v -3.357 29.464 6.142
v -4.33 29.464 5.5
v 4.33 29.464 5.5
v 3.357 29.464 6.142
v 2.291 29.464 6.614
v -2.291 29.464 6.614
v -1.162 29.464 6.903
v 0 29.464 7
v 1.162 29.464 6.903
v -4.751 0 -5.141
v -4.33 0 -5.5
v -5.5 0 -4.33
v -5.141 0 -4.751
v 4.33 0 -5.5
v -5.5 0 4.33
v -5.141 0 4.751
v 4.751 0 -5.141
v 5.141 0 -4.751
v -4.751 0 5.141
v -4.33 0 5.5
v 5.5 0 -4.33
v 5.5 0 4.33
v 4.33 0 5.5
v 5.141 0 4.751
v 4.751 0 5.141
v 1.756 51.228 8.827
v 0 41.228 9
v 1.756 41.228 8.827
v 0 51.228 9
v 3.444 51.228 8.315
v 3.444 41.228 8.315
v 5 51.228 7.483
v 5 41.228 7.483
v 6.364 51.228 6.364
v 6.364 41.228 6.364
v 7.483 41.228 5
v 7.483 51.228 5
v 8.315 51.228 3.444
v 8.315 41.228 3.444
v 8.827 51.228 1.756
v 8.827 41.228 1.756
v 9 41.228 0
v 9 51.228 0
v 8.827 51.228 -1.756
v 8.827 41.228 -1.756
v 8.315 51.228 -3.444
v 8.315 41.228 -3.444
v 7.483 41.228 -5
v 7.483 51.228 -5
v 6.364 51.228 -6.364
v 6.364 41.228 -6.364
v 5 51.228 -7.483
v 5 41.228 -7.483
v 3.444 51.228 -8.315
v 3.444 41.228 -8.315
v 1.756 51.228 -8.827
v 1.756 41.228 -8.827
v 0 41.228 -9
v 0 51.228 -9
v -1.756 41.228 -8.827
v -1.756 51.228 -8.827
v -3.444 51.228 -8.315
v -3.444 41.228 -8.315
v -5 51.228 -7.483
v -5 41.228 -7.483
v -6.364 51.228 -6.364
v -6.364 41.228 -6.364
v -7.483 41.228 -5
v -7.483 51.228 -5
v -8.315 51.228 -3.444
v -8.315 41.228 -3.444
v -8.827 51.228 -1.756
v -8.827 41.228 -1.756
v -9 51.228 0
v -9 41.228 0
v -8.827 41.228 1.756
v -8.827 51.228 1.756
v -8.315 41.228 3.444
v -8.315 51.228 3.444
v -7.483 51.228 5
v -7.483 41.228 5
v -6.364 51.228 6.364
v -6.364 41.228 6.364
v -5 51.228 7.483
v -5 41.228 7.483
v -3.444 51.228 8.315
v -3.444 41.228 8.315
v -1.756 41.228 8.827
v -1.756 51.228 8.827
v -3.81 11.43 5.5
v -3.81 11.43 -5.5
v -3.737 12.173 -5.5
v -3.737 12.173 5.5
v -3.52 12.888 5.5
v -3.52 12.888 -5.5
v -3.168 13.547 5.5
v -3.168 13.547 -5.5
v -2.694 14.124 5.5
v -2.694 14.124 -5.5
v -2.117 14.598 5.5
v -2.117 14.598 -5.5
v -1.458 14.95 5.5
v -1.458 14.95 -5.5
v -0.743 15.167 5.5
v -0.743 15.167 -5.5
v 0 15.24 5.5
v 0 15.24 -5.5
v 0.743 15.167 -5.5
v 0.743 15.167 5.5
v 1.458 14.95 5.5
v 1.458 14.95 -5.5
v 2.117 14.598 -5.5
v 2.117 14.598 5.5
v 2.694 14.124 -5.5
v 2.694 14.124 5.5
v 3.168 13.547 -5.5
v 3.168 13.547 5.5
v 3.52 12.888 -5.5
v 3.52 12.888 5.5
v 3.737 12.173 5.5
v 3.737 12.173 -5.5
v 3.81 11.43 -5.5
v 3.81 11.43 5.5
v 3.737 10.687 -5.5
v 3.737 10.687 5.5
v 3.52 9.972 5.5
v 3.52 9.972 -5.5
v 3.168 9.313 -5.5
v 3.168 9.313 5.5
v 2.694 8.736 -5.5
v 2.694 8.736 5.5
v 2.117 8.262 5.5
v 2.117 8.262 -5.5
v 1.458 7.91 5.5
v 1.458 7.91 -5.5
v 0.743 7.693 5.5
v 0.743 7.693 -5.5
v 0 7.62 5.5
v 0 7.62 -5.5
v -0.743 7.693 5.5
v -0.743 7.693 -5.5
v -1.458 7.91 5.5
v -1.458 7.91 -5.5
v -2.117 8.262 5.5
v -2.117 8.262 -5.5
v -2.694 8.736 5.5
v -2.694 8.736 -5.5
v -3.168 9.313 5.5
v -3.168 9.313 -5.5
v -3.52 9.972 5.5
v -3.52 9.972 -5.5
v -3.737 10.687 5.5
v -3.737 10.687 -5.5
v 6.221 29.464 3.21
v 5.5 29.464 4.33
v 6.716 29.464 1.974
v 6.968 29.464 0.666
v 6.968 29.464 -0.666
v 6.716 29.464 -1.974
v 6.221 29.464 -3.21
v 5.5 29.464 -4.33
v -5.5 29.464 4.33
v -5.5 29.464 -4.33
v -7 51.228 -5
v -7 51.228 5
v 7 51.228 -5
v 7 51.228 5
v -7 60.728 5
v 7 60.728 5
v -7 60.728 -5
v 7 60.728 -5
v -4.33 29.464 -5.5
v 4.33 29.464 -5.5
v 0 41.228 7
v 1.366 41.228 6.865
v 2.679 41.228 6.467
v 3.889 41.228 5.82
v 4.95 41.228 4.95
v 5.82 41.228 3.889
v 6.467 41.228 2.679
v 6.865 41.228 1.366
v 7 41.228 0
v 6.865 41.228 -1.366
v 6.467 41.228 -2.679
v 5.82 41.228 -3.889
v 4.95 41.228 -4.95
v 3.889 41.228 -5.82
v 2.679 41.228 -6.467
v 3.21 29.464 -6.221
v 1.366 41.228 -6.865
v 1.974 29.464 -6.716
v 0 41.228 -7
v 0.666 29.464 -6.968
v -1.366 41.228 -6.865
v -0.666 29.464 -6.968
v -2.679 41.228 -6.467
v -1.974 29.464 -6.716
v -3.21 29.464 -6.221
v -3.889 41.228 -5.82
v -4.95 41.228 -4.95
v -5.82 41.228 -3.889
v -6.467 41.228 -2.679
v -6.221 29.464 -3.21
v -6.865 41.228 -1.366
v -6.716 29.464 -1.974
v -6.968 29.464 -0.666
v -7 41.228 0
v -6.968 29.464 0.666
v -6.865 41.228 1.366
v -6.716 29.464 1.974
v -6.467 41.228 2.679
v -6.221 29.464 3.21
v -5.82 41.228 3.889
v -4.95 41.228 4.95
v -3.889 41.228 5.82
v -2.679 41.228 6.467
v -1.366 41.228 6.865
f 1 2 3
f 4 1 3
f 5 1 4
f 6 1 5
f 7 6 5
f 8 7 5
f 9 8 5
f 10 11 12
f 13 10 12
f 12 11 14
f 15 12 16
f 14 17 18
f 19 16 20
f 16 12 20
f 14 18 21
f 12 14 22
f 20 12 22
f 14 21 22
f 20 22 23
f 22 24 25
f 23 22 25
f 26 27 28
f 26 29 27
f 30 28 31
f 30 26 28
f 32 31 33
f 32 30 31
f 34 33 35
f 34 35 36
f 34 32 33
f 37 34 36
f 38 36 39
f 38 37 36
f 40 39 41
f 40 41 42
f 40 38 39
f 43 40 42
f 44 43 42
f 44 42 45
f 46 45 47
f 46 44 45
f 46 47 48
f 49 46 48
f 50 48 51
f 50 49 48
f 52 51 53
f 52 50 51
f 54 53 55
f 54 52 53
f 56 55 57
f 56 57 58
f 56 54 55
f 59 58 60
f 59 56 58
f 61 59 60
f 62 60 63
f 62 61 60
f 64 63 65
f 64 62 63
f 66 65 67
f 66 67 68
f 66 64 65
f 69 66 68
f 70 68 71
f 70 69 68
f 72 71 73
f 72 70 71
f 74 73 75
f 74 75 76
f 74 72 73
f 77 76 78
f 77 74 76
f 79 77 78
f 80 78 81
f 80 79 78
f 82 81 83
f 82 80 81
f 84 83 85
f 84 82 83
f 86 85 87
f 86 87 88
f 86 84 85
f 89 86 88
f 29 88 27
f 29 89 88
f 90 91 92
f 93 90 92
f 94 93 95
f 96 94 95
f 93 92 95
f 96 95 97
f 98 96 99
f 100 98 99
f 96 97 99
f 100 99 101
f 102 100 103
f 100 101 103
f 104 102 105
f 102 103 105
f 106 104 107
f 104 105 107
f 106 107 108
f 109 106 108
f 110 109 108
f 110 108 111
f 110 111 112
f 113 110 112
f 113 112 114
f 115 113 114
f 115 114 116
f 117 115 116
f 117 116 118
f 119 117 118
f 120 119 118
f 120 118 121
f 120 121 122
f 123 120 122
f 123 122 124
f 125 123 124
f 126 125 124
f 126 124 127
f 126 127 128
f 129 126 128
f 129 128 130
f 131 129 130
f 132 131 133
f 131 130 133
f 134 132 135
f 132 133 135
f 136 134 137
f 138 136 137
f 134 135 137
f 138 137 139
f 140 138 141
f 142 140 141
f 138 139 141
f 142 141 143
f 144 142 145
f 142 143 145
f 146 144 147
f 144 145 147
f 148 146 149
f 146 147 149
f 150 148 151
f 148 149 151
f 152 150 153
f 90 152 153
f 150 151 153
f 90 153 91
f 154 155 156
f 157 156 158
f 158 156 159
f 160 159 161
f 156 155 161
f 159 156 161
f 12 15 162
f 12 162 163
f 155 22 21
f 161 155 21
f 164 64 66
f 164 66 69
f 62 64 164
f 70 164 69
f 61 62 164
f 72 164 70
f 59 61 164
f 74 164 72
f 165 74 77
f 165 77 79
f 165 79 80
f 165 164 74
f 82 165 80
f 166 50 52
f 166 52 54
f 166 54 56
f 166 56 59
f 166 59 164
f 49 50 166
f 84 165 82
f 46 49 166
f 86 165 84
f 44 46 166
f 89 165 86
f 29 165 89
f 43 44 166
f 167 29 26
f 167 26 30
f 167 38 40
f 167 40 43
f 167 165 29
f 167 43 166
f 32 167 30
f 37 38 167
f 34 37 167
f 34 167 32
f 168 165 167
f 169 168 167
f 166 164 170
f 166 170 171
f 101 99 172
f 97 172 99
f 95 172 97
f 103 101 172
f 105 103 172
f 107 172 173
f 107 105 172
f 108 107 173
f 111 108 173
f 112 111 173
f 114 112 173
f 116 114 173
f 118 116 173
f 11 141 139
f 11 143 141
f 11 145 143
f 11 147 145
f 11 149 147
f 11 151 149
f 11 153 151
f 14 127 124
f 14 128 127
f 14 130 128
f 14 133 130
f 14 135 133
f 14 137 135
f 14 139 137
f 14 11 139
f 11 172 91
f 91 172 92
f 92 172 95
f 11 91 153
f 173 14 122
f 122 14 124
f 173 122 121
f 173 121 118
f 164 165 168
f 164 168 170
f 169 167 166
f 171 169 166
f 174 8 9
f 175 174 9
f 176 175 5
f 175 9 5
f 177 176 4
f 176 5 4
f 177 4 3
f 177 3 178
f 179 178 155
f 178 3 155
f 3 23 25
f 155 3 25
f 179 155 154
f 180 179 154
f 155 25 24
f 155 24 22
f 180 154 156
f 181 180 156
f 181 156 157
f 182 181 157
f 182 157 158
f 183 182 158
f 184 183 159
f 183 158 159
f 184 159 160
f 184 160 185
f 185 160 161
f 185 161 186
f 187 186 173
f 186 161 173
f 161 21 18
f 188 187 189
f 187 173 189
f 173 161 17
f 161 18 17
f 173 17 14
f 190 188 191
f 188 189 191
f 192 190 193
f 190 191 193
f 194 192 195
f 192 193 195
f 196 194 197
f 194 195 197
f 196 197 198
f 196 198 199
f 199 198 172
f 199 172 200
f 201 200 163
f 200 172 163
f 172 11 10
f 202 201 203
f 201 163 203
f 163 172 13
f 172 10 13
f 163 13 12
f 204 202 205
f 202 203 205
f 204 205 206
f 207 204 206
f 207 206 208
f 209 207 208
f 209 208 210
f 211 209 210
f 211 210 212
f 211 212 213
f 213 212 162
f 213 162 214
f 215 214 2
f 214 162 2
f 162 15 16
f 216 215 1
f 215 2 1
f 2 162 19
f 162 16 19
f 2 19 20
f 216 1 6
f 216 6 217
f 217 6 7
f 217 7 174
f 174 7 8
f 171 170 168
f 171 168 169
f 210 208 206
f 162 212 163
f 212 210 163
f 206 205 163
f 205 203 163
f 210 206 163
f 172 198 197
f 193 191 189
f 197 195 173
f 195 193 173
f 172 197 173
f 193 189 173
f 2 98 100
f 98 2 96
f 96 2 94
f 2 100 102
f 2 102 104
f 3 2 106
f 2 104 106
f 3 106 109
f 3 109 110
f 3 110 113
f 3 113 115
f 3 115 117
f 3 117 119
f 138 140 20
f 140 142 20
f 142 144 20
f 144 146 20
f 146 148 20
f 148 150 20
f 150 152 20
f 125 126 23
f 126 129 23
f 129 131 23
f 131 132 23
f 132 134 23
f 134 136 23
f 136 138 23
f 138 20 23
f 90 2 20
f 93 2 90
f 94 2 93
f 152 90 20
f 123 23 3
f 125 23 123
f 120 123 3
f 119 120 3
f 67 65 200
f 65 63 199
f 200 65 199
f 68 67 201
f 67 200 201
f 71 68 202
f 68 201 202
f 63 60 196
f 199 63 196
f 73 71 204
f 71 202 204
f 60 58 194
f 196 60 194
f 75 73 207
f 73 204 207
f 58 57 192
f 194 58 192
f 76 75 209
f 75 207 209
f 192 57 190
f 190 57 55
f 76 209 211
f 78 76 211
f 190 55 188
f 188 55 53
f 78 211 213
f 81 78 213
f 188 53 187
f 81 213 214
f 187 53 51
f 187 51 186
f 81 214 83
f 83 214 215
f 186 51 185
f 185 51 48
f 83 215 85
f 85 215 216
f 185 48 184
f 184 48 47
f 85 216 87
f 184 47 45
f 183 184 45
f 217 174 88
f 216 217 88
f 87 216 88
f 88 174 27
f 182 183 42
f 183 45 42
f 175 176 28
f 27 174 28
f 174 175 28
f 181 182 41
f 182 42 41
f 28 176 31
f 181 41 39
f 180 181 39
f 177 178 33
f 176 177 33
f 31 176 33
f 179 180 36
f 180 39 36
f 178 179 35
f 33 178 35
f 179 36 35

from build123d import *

# Parameters (mm, degrees)
SKETCH1_R           = 7
BOSS_EXTRUDE1_DEPTH = 46.228
SKETCH2_R           = 9
BOSS_EXTRUDE2_DEPTH = 5
SKETCH3_W           = 14
SKETCH3_H           = 10
BOSS_EXTRUDE3_DEPTH = 9.5
SKETCH4_OUTSIDE_W   = 33.17
SKETCH4_OUTSIDE_H   = 33.17
SKETCH4_OUTSIDE_W_2 = 11
SKETCH4_OUTSIDE_H_2 = 11
CUT_EXTRUDE1_DEPTH  = 29.464
SKETCH5_R           = 3.81
CUT_EXTRUDE2_DEPTH  = 64.080424729


with BuildPart() as part:
    # Sketch1 → Boss-Extrude1 (new body)
    with BuildSketch(Plane(origin=(0, 0, 0), x_dir=(1, 0, 0), z_dir=(0, 1, 0))):
        Circle(SKETCH1_R)
    extrude(amount=BOSS_EXTRUDE1_DEPTH)

    # Sketch2 → Boss-Extrude2 (add, symmetric)
    with BuildSketch(Plane(origin=(0, 46.228, 0), x_dir=(1, 0, 0), z_dir=(0, 1, 0))):
        Circle(SKETCH2_R)
    extrude(amount=BOSS_EXTRUDE2_DEPTH, both=True)

    # Sketch3 → Boss-Extrude3 (add)
    with BuildSketch(Plane(origin=(0, 51.228, 0), x_dir=(1, 0, 0), z_dir=(0, 1, 0))):
        Rectangle(SKETCH3_W, SKETCH3_H)
    extrude(amount=BOSS_EXTRUDE3_DEPTH)

    # Sketch4 outside → Cut-Extrude1 (cut)
    with BuildSketch(Plane(origin=(0, 0, 0), x_dir=(1, 0, 0), z_dir=(0, 1, 0))):
        Rectangle(SKETCH4_OUTSIDE_W, SKETCH4_OUTSIDE_H)
        Rectangle(SKETCH4_OUTSIDE_W_2, SKETCH4_OUTSIDE_H_2, mode=Mode.SUBTRACT)
    extrude(amount=CUT_EXTRUDE1_DEPTH, mode=Mode.SUBTRACT)

    # Sketch5 → Cut-Extrude2 (cut, through all)
    with BuildSketch(Plane(origin=(0, 0, -5.5), x_dir=(-1, 0, 0), z_dir=(0, 0, -1))):
        with Locations((0, 11.43)):
            Circle(SKETCH5_R)
    extrude(amount=-CUT_EXTRUDE2_DEPTH, mode=Mode.SUBTRACT)


solid = part.part
